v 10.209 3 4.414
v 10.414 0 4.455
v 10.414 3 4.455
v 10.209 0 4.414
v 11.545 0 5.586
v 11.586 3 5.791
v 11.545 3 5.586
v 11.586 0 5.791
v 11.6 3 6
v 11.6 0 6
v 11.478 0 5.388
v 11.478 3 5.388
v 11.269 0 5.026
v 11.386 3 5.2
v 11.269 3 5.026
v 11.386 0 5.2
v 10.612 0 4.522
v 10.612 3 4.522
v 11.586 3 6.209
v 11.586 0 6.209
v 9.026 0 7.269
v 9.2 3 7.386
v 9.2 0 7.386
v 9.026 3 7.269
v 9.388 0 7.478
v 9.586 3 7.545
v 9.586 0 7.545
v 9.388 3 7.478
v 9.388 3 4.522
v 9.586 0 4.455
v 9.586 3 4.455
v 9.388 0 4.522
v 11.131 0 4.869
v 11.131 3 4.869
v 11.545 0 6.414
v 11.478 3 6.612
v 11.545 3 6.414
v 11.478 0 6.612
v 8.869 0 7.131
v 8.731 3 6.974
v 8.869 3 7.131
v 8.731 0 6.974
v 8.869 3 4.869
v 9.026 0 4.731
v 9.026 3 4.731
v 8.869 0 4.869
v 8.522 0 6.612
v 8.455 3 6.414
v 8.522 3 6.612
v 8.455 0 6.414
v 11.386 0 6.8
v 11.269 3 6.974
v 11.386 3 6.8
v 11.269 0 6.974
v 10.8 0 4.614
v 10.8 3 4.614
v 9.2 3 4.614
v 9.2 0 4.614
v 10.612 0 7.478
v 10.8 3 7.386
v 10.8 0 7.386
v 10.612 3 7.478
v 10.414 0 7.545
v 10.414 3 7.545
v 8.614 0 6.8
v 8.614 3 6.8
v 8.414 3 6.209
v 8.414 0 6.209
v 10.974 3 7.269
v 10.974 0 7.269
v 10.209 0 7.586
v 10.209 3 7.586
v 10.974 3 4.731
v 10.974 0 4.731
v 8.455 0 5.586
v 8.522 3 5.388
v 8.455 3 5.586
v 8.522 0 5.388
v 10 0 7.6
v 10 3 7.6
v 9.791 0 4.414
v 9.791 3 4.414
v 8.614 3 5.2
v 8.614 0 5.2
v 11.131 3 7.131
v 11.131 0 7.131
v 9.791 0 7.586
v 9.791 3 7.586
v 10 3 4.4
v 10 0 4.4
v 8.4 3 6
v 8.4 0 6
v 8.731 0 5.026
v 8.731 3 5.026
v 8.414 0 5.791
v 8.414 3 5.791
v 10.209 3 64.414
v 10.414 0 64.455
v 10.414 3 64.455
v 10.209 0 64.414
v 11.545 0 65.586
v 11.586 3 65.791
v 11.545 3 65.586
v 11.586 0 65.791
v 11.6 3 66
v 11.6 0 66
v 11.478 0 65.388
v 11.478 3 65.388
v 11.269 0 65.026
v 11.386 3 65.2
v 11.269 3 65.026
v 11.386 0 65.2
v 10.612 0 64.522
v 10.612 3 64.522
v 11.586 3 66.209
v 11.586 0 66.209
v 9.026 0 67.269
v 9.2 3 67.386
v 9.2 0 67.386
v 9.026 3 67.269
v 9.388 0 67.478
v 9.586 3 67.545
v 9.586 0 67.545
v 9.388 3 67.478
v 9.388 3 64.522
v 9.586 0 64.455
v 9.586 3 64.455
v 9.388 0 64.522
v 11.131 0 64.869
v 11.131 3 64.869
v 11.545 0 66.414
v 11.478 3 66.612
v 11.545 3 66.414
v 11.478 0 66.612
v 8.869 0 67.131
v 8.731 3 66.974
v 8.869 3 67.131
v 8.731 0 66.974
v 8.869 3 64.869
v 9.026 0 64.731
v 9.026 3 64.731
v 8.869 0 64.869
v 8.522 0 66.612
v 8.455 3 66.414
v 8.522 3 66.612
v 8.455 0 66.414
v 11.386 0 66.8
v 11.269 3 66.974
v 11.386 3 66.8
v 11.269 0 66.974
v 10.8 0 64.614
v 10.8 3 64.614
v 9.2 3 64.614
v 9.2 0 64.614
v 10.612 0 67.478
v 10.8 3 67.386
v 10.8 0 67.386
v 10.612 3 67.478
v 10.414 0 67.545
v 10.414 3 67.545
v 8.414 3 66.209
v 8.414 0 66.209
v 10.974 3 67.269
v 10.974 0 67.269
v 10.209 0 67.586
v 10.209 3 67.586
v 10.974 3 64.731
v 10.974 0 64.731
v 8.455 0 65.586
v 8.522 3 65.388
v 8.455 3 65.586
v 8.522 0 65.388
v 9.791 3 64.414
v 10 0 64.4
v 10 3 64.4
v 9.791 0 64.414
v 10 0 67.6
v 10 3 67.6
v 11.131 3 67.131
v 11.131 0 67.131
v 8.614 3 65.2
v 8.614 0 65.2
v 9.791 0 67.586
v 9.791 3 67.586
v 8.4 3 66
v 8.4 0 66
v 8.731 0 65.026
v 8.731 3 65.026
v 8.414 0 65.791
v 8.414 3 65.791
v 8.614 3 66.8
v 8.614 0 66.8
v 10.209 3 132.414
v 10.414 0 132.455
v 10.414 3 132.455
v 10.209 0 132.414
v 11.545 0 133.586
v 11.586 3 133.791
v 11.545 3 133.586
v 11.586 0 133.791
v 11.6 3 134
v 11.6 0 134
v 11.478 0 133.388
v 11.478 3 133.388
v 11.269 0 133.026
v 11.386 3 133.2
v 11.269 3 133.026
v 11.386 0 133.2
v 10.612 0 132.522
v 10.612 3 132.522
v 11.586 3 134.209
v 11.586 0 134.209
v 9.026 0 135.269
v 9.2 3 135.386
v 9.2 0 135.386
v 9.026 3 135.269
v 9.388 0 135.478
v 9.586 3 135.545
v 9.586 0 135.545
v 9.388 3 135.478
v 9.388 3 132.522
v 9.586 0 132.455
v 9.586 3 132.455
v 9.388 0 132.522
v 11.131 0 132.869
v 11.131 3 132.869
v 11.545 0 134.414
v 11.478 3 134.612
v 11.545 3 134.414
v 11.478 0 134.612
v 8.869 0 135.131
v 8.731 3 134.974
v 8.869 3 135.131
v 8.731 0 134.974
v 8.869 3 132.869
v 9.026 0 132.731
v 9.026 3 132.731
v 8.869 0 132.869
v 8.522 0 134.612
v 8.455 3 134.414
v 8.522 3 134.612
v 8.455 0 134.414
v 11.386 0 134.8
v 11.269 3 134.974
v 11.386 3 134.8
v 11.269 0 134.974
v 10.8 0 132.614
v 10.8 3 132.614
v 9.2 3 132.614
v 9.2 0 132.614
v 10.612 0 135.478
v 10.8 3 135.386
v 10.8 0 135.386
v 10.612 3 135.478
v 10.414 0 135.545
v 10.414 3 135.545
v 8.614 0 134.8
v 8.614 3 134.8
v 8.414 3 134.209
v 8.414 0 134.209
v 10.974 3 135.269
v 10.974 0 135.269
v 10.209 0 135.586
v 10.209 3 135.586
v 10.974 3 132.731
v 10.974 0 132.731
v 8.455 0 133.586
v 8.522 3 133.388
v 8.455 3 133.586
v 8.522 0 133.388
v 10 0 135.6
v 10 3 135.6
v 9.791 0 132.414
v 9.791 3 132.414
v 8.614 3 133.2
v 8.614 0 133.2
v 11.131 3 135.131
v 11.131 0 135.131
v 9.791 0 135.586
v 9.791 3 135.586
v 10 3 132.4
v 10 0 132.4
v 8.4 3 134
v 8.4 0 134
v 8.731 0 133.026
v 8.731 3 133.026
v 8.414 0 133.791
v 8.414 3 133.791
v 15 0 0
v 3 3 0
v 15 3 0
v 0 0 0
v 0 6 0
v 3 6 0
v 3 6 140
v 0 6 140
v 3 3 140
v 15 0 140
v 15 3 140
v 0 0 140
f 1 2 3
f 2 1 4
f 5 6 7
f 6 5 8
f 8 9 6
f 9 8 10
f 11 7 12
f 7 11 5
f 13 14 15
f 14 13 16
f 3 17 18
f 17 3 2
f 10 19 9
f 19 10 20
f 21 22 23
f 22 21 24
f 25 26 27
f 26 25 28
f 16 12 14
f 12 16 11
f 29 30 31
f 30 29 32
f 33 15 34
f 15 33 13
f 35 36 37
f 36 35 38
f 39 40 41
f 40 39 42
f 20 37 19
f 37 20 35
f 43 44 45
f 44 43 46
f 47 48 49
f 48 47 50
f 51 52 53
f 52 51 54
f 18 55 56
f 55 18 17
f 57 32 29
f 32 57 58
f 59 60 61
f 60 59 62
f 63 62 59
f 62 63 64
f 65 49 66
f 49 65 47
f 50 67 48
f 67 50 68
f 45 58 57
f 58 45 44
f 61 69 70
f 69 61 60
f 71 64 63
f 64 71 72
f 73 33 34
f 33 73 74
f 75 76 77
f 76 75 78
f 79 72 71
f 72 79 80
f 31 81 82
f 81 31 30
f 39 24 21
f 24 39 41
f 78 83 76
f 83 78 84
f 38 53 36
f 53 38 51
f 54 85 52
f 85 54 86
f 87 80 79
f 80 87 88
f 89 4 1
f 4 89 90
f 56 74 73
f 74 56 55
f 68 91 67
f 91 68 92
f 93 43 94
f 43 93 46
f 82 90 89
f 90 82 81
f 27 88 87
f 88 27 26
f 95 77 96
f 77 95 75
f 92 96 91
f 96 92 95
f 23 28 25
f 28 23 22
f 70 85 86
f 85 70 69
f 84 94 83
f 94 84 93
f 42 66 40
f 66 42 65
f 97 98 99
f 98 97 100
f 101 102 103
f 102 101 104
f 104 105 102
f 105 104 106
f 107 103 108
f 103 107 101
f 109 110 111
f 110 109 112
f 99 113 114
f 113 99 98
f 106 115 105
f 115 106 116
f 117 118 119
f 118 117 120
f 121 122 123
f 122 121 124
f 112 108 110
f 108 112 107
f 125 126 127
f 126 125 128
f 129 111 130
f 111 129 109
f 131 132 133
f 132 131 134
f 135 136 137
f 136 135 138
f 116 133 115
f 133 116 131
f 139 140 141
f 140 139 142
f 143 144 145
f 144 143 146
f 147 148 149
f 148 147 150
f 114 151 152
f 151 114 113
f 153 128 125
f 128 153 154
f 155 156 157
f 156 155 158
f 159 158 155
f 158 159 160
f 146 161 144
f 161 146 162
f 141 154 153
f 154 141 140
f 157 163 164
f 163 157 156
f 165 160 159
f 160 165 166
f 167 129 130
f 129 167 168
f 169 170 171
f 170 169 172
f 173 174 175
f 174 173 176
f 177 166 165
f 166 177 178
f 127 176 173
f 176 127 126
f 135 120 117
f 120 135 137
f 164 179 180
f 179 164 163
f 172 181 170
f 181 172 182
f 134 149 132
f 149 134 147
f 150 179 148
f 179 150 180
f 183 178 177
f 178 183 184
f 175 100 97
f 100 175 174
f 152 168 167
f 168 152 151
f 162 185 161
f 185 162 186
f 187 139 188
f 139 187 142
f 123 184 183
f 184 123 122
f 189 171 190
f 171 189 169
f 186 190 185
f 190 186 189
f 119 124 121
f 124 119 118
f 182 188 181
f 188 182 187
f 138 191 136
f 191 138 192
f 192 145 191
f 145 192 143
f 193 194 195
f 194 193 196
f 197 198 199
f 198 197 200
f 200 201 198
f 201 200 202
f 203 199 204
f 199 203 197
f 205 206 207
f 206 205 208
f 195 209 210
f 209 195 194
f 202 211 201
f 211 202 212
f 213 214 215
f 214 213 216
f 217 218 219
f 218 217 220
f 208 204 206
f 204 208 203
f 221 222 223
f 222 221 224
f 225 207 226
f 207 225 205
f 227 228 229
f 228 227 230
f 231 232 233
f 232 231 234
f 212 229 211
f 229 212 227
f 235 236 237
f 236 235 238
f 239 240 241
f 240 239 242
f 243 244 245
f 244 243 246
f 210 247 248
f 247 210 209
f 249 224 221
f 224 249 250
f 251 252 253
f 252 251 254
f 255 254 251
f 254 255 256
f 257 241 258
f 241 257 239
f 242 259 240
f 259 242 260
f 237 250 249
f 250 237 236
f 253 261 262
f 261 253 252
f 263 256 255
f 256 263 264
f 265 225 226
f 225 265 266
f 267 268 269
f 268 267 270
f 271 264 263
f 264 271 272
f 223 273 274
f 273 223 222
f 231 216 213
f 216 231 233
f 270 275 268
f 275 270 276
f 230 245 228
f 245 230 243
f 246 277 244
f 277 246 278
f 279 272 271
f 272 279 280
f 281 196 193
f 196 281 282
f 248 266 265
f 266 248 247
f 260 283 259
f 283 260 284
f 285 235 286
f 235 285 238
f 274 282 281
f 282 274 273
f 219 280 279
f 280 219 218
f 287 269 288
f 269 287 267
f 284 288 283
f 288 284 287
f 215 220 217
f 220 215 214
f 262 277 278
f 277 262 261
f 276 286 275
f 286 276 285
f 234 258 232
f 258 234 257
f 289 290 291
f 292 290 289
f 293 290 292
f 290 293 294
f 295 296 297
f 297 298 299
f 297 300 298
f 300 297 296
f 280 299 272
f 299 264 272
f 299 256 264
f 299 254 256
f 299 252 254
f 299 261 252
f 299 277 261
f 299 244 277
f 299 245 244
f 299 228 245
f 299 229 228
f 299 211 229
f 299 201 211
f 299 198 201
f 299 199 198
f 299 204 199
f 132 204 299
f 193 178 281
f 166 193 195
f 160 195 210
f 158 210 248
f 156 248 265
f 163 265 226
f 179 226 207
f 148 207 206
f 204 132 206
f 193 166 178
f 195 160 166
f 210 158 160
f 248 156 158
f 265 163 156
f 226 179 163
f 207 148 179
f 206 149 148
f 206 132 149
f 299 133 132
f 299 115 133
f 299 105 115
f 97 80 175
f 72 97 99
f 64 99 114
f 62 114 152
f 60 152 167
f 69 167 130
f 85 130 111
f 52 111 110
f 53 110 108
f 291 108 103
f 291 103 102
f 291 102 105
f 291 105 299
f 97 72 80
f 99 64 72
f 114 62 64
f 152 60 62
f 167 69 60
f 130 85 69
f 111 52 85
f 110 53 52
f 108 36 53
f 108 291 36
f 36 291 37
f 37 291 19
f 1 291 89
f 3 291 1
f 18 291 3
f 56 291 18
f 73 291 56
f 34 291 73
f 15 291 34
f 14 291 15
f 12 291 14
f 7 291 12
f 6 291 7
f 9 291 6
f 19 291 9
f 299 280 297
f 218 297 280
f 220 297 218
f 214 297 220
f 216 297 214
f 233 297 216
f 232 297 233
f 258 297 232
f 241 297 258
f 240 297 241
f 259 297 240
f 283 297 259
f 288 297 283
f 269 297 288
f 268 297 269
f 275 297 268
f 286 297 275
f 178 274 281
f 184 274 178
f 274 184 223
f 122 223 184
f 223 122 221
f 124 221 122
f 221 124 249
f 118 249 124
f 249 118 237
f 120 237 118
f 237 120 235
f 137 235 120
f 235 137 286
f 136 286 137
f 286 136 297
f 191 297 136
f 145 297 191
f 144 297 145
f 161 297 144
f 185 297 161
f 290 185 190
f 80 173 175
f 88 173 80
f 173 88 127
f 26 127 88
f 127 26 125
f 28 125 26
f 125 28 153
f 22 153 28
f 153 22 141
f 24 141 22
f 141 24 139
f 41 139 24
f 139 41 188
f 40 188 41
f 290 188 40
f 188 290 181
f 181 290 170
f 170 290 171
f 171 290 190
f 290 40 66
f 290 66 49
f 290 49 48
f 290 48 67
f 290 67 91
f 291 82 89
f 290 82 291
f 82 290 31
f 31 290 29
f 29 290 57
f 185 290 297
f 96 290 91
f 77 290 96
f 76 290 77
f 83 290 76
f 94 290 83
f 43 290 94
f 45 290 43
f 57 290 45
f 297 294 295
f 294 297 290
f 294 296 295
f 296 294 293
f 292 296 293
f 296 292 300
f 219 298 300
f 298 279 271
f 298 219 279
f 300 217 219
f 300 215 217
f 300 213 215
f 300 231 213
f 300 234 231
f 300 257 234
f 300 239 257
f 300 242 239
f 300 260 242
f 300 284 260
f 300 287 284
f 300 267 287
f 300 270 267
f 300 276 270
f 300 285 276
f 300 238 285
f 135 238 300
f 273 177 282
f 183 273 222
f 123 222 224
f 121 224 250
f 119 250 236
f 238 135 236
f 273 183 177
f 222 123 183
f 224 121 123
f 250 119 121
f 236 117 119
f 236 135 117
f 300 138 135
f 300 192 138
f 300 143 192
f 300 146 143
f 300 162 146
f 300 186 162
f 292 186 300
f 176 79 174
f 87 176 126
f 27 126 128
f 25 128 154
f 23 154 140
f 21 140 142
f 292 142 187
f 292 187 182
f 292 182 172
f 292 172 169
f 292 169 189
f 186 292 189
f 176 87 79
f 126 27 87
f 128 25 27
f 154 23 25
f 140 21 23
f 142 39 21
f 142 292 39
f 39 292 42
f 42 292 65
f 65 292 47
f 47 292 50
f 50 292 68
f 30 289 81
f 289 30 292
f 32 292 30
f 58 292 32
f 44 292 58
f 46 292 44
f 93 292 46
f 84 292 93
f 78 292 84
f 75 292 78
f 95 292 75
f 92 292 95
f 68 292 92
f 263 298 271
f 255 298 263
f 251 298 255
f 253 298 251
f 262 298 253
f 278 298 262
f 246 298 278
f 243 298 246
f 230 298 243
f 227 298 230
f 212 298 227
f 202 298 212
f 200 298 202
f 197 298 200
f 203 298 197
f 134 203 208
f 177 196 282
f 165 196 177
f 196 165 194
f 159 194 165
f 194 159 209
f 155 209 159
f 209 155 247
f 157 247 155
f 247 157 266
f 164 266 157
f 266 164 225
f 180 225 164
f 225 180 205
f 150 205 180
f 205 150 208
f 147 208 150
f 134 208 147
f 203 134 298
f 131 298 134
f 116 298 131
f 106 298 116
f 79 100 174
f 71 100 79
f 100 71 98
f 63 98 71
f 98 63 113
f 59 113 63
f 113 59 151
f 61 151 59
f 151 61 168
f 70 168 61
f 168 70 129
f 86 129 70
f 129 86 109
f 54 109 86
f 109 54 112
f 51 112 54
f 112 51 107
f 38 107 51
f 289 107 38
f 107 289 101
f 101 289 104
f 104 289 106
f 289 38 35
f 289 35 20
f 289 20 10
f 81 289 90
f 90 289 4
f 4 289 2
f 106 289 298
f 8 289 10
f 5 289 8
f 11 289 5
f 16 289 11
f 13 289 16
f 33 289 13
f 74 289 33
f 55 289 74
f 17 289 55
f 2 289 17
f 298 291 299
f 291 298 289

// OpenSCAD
// L-angle bracket for POV 3D — parametric
// All dimensions in mm. Cross-section drawn in (u, v) plane, extruded along Z.

length    = 140;    // 总长 / bracket length
leg_a     = 15;     // 水平腿外形长 / leg A outer length (with M3 holes)
leg_b     = 6;      // 斜腿外形长   / leg B outer length (short stub)
thick_a   = 3;      // 水平腿壁厚   / leg A thickness
thick_b   = 3;      // 斜腿壁厚     / leg B thickness
angle_deg = 90;     // 两腿夹角     / inside angle at outer corner

// M3 通孔 / M3 clearance through-holes on leg A
hole_diam            = 3.2;
hole_y_from_free_end = 5;     // 孔 Y 位置（从 leg A 自由端起算）
// X positions kept at original 4-hole pattern (200 mm, X=6,66,134,194);
// right-side trimmed to 170 mm removes X=194, leaving 3 holes.
hole_x_positions     = [6, 66, 134];

// --- Derived ---
ct = cos(angle_deg);
st = sin(angle_deg);
u_inner = (thick_a + thick_b * ct) / st;
p3_y    = thick_b * st + u_inner * ct;
hole_y  = leg_a - hole_y_from_free_end;
hole_xs = hole_x_positions;

// --- Geometry ---
module bracket() {
    difference() {
        linear_extrude(height = length)
            polygon([
                [0,                              0                            ],  // P0 outer corner
                [leg_a,                          0                            ],  // P1 leg A outer end
                [leg_a,                          thick_a                      ],  // P2 leg A inner-start
                [p3_y,                           thick_a                      ],  // P3 inner corner
                [leg_b*ct + thick_b*st,          leg_b*st - thick_b*ct        ],  // P4 leg B inner end
                [leg_b*ct,                       leg_b*st                     ]   // P5 leg B outer end
            ]);
        for (hx = hole_xs)
            translate([hole_y, -1, hx])
                rotate([-90, 0, 0])
                    cylinder(h = thick_a + 2, d = hole_diam, $fn = 48);
    }
}

bracket();
